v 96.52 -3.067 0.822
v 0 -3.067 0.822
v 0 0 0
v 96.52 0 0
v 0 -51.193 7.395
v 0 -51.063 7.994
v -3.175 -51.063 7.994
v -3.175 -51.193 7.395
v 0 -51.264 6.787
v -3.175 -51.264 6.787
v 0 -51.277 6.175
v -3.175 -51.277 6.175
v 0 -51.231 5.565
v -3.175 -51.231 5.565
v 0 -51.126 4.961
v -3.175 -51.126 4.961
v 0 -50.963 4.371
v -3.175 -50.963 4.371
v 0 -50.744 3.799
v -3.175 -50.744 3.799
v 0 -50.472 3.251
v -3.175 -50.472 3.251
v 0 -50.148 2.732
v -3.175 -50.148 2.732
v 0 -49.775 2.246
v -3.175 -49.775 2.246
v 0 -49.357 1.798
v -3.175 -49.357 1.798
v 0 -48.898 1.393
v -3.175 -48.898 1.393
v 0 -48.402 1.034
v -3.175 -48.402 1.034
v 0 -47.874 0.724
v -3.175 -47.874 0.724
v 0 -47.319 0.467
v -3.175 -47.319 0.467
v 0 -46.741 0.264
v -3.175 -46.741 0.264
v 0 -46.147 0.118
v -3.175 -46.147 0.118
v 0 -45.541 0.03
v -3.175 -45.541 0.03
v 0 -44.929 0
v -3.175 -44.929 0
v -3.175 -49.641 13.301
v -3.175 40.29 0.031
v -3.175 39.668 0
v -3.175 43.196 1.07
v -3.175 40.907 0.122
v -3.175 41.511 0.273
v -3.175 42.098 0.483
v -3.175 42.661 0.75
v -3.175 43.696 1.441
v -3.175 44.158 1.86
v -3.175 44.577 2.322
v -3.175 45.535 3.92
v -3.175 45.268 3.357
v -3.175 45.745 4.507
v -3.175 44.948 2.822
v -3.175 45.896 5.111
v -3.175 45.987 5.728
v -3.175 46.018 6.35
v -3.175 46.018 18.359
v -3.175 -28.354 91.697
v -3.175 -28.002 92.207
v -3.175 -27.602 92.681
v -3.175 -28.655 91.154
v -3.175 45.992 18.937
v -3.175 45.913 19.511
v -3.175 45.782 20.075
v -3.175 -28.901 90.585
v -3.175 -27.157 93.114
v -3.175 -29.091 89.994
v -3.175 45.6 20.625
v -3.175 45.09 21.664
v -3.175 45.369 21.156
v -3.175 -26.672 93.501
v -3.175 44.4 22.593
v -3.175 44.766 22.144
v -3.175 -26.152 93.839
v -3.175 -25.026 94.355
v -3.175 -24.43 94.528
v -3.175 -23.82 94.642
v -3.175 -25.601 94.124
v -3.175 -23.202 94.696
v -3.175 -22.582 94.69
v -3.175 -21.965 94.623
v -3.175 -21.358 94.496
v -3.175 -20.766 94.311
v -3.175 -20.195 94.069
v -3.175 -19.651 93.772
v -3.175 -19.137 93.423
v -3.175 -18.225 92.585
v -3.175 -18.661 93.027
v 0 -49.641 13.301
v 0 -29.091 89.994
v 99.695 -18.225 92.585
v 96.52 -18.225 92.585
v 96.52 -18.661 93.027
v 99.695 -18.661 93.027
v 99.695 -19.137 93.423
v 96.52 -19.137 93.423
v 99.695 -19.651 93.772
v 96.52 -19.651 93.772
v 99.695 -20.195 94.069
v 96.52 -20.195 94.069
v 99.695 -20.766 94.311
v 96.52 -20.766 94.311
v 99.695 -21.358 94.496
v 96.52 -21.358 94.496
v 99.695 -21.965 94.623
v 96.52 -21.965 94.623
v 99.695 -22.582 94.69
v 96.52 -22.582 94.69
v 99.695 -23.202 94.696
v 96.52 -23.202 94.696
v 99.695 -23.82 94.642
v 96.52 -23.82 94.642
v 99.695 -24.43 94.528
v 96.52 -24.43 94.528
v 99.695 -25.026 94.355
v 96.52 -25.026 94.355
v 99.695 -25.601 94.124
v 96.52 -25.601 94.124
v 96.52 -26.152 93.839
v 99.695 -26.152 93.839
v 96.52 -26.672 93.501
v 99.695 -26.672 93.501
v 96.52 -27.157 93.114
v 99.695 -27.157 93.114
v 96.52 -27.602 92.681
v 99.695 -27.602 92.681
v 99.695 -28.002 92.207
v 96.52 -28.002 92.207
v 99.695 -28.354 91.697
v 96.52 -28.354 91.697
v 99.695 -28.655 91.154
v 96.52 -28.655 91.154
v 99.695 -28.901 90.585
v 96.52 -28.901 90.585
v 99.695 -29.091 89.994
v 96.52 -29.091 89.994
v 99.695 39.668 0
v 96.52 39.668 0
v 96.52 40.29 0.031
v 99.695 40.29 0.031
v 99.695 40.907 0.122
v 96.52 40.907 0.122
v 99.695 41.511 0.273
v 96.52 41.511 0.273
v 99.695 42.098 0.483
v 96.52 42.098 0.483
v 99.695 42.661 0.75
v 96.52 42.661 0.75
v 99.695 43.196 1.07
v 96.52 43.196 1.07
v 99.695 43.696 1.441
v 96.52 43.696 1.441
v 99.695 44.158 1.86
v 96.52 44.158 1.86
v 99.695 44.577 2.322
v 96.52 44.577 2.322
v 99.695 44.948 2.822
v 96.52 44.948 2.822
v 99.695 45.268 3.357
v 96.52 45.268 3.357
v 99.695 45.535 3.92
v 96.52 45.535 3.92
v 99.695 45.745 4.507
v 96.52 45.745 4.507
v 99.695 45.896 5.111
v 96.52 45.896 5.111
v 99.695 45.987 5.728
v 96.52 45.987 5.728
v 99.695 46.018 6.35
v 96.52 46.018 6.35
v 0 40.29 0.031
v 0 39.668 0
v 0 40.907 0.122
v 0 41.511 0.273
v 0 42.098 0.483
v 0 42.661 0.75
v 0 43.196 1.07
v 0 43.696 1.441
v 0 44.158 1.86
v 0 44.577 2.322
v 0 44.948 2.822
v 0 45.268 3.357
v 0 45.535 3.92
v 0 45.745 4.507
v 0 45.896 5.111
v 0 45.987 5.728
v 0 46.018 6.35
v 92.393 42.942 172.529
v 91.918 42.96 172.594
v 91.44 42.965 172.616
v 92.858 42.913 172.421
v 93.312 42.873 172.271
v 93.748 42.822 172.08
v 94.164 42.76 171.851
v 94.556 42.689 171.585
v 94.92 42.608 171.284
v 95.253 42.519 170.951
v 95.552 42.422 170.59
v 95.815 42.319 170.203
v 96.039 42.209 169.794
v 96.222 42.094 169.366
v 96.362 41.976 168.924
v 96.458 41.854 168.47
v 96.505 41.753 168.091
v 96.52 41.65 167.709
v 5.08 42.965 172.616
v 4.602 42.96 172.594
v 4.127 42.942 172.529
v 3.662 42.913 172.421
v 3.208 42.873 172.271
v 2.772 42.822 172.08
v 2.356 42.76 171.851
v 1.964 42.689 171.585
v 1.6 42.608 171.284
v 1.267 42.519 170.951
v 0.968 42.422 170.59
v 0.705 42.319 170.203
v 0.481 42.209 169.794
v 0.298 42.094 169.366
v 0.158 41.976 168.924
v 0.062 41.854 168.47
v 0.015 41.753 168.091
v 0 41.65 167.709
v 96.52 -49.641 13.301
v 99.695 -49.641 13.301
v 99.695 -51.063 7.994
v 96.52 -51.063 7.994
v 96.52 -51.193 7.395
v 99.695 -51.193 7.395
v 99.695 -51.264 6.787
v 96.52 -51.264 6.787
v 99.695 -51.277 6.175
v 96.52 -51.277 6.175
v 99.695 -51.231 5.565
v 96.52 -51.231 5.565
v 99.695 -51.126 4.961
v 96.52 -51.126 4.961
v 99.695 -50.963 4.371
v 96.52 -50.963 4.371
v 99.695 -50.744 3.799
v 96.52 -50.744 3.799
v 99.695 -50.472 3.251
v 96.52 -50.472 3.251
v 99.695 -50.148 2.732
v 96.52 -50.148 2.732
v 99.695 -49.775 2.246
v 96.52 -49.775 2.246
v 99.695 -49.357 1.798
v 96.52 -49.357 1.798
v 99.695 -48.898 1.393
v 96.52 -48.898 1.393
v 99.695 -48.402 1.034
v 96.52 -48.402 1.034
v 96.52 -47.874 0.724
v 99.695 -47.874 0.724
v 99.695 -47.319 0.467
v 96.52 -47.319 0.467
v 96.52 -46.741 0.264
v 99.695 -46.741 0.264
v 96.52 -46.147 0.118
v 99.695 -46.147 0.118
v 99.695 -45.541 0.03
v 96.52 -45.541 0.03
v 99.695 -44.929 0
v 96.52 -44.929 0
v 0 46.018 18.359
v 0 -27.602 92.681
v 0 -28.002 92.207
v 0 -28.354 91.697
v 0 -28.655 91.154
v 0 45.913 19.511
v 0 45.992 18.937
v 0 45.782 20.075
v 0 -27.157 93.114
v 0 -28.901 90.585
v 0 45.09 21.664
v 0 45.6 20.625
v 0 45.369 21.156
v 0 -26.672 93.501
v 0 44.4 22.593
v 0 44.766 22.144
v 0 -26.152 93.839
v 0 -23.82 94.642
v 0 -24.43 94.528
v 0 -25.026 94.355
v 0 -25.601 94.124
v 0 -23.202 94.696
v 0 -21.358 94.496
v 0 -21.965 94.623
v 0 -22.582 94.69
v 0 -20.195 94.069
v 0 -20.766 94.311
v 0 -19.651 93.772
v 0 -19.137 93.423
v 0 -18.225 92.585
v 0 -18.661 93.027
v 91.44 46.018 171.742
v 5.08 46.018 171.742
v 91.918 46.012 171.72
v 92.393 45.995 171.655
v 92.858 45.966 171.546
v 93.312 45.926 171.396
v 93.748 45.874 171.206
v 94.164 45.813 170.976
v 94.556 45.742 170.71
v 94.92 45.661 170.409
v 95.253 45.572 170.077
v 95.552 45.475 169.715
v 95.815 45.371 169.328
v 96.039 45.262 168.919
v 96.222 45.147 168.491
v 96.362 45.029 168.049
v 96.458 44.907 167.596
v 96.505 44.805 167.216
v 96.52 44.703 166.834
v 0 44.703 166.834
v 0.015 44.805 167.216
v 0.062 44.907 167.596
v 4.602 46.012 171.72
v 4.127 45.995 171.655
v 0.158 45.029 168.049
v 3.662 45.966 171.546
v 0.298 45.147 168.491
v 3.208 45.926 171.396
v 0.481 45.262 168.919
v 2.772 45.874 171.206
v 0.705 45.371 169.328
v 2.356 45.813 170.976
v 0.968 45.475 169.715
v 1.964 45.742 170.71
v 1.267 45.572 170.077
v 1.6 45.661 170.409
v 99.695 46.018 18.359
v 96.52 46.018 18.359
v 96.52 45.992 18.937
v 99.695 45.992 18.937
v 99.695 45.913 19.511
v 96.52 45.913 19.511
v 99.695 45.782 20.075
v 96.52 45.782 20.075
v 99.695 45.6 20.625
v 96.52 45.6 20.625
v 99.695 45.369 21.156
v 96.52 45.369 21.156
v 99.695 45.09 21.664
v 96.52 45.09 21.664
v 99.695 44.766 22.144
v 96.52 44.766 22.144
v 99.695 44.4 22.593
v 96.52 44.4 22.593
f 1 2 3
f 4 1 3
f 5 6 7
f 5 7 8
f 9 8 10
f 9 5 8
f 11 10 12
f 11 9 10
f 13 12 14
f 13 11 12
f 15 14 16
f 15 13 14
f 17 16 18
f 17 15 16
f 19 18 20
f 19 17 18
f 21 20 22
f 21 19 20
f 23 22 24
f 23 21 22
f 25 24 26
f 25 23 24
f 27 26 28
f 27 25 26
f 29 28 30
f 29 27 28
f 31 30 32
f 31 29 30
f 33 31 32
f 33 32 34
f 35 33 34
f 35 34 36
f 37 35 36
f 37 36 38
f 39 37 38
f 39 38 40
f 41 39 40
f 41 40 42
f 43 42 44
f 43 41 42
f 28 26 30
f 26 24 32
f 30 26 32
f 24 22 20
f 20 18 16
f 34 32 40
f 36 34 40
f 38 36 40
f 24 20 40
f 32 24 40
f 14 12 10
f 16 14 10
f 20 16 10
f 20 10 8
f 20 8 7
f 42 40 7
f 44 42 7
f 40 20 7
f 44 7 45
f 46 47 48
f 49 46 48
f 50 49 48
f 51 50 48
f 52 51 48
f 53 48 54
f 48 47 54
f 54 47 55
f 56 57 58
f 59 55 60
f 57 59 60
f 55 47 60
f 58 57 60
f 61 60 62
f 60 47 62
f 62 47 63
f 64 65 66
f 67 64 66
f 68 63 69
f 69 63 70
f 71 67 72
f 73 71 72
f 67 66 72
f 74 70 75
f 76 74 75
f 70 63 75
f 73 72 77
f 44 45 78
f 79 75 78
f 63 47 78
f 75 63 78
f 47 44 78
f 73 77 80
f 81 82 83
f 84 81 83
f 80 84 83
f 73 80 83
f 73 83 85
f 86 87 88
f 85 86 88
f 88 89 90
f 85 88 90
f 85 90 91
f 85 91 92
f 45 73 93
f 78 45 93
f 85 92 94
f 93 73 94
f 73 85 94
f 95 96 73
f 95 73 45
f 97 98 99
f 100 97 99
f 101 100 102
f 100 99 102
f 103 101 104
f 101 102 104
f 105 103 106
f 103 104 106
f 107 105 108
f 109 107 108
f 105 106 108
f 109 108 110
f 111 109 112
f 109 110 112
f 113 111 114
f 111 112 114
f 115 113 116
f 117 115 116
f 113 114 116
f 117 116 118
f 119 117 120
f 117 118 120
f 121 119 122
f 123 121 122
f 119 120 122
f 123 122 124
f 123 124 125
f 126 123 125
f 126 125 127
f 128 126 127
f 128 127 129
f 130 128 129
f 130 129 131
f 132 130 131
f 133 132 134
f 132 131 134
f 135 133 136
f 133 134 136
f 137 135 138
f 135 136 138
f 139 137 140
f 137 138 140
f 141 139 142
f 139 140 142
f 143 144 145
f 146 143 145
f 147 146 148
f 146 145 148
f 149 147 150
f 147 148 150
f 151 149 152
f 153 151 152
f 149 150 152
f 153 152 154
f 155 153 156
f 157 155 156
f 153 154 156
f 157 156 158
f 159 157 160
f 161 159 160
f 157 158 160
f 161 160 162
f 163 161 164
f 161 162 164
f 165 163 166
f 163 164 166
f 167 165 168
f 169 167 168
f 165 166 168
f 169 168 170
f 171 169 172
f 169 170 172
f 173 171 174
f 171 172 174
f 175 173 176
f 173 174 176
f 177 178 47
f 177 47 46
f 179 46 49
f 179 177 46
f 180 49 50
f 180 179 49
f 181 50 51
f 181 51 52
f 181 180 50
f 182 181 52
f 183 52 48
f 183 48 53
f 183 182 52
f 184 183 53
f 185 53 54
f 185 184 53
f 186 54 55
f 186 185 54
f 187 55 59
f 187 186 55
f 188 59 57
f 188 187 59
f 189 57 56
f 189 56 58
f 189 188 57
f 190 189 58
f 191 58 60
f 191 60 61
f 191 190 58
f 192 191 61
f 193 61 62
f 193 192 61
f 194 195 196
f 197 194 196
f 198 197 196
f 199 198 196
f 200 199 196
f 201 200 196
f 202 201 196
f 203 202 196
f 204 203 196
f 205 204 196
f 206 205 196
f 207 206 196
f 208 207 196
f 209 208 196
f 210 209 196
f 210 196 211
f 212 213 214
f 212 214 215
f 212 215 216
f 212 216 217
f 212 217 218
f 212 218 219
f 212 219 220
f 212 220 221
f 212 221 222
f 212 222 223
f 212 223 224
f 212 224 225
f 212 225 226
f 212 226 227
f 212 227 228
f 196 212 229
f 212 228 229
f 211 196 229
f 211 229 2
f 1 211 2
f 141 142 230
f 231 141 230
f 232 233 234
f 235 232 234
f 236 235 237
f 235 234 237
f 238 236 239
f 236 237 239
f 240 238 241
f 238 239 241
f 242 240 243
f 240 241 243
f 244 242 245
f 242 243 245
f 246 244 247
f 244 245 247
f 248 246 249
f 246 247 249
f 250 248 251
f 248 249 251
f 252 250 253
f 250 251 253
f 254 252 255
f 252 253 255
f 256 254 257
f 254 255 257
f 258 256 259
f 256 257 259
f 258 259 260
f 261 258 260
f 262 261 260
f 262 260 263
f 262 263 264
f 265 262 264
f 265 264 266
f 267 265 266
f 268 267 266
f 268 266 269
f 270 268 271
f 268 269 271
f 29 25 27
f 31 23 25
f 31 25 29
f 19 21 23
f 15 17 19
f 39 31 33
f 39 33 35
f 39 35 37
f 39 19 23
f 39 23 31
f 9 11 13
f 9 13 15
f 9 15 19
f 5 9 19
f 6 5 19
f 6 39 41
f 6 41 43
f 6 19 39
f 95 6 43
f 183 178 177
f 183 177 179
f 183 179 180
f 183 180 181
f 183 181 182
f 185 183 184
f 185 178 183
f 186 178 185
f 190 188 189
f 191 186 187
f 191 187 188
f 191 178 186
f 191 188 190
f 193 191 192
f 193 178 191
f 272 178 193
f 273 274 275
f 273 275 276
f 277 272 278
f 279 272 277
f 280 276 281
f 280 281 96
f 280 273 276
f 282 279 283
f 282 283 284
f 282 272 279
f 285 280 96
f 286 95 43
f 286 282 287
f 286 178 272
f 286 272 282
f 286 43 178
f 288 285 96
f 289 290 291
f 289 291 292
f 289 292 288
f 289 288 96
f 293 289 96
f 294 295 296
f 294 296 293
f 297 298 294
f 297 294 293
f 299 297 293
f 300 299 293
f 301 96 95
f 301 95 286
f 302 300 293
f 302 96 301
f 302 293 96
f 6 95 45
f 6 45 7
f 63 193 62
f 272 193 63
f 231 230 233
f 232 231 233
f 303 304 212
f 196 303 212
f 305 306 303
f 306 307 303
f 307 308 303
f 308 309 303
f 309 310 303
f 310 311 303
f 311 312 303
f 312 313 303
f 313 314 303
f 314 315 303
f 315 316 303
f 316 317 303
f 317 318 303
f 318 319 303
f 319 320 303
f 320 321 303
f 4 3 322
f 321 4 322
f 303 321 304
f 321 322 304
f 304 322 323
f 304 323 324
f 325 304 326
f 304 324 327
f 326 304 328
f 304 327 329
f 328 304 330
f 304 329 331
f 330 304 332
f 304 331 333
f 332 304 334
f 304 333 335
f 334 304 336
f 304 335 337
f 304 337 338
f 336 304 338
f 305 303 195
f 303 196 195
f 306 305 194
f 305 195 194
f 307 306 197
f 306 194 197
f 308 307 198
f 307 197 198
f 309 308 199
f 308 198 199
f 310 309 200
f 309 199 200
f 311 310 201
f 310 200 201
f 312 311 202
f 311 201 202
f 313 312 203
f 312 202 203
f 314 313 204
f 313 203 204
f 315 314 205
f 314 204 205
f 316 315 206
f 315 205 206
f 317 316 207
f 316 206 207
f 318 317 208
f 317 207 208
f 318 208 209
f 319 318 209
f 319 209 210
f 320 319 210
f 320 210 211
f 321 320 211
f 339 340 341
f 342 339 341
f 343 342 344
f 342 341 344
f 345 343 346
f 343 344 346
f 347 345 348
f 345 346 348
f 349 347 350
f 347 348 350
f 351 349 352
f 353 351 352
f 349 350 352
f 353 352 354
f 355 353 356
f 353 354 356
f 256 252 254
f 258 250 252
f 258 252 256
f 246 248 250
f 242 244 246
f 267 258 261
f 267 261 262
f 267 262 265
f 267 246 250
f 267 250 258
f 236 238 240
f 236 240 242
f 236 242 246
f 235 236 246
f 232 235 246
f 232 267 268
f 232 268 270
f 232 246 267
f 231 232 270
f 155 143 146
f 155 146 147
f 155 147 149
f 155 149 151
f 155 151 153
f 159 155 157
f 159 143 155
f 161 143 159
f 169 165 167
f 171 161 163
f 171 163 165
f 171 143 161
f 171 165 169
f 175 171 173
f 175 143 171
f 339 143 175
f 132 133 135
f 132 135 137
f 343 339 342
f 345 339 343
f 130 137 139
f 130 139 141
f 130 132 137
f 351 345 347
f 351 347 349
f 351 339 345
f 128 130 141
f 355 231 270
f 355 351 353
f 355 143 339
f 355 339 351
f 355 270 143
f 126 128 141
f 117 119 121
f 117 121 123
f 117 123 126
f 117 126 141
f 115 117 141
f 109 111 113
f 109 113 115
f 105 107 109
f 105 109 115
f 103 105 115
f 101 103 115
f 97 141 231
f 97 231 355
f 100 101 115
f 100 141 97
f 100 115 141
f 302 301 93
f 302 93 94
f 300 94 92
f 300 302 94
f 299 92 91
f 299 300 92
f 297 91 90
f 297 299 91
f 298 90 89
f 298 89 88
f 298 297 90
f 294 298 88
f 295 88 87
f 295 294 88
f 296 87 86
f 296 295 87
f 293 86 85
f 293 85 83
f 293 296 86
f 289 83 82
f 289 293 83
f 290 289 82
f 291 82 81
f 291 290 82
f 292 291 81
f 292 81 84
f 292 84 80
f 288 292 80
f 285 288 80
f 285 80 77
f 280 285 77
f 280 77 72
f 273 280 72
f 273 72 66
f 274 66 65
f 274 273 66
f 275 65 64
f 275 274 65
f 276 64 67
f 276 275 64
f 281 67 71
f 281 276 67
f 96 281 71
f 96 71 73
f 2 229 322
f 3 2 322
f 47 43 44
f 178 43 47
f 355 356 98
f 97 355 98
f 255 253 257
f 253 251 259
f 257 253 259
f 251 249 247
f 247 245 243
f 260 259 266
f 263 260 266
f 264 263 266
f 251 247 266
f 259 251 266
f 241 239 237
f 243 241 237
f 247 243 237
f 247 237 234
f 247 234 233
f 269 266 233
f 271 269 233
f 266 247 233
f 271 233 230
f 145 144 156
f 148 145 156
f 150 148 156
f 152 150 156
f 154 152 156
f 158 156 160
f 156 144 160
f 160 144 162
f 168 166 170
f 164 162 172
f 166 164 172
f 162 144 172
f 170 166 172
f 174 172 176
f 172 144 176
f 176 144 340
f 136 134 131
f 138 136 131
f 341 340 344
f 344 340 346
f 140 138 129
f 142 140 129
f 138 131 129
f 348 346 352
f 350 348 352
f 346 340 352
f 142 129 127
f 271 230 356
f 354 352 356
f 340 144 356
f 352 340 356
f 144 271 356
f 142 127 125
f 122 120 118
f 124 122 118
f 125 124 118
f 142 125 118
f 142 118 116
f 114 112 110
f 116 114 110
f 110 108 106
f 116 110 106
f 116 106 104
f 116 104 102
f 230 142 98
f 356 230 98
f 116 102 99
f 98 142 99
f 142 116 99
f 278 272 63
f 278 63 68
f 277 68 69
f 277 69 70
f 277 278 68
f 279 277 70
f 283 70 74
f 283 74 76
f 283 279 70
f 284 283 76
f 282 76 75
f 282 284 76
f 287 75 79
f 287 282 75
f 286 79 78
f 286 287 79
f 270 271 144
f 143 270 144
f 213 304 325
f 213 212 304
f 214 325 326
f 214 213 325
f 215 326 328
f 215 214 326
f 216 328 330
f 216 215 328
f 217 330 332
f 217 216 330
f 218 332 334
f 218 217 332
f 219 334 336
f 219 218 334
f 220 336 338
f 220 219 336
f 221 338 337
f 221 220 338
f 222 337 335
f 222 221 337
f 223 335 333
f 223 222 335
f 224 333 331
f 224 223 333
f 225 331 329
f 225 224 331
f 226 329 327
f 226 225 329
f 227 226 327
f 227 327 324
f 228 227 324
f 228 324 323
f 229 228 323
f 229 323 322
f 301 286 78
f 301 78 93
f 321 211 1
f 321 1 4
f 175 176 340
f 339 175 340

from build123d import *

# Parameters (mm, degrees)
F1_DEPTH = 96.52
F3_DEPTH = 3.175
F9_R     = 5.08


with BuildPart() as f1:
    # F0 (on Right) → F1 (new body)
    with BuildSketch(Plane.YZ):
        Polygon((-3.0668144985, 0.8217504682), (0, 0), (46.0180262192, 171.7416119142), (42.9653809118, 172.6162425231), align=None)
    extrude(amount=F1_DEPTH)

    # F9
    f9_edges = [f1.edges().sort_by_distance(p)[0] for p in [
        (0, 44.491704, 172.178927),
        (96.52, 44.491704, 172.178927),
    ]]
    fillet(f9_edges, radius=F9_R)


with BuildPart() as f3:
    # F2 (on Right) → F3 (new body)
    with BuildSketch(Plane.YZ):
        with BuildLine():
            Line((-49.6407644802, 13.3012027541), (0, 0))
            Line((0, 0), (39.6680262192, 0))
            ThreePointArc((39.6680262192, 0), (44.1581542798, 1.8598719395), (46.0180262192, 6.35))
            Line((46.0180262192, 6.35), (46.0180262192, 18.3586289937))
            ThreePointArc((46.0180262192, 18.3586289937), (45.5998198767, 20.6249749524), (44.4002863752, 22.5928011461))
            Line((44.4002863752, 22.5928011461), (-18.22500464, 92.5850354641))
            ThreePointArc((-18.22500464, 92.5850354641), (-24.4299674117, 94.5277271605), (-29.0908937929, 89.9943642482))
            Line((-29.0908937929, 89.9943642482), (-49.6407644802, 13.3012027541))
        make_face()
        with BuildLine():
            Line((-44.929329899, 0), (0, 0))
            Line((0, 0), (-49.6407644802, 13.3012027541))
            Line((-49.6407644802, 13.3012027541), (-51.062958896, 7.9935009364))
            ThreePointArc((-51.062958896, 7.9935009364), (-49.9671236099, 2.4843649258), (-44.929329899, 0))
        make_face()
    extrude(amount=-F3_DEPTH)


with BuildPart() as f8_1:
    # F8: instance of F3
    add(f3.part.mirror(Plane(origin=(48.26, 42.9653809118, 172.6162425231), x_dir=(0, -0.2588190451, -0.9659258263), z_dir=(-1, 0, 0))))


solid = Compound([f1.part, f3.part, f8_1.part])
